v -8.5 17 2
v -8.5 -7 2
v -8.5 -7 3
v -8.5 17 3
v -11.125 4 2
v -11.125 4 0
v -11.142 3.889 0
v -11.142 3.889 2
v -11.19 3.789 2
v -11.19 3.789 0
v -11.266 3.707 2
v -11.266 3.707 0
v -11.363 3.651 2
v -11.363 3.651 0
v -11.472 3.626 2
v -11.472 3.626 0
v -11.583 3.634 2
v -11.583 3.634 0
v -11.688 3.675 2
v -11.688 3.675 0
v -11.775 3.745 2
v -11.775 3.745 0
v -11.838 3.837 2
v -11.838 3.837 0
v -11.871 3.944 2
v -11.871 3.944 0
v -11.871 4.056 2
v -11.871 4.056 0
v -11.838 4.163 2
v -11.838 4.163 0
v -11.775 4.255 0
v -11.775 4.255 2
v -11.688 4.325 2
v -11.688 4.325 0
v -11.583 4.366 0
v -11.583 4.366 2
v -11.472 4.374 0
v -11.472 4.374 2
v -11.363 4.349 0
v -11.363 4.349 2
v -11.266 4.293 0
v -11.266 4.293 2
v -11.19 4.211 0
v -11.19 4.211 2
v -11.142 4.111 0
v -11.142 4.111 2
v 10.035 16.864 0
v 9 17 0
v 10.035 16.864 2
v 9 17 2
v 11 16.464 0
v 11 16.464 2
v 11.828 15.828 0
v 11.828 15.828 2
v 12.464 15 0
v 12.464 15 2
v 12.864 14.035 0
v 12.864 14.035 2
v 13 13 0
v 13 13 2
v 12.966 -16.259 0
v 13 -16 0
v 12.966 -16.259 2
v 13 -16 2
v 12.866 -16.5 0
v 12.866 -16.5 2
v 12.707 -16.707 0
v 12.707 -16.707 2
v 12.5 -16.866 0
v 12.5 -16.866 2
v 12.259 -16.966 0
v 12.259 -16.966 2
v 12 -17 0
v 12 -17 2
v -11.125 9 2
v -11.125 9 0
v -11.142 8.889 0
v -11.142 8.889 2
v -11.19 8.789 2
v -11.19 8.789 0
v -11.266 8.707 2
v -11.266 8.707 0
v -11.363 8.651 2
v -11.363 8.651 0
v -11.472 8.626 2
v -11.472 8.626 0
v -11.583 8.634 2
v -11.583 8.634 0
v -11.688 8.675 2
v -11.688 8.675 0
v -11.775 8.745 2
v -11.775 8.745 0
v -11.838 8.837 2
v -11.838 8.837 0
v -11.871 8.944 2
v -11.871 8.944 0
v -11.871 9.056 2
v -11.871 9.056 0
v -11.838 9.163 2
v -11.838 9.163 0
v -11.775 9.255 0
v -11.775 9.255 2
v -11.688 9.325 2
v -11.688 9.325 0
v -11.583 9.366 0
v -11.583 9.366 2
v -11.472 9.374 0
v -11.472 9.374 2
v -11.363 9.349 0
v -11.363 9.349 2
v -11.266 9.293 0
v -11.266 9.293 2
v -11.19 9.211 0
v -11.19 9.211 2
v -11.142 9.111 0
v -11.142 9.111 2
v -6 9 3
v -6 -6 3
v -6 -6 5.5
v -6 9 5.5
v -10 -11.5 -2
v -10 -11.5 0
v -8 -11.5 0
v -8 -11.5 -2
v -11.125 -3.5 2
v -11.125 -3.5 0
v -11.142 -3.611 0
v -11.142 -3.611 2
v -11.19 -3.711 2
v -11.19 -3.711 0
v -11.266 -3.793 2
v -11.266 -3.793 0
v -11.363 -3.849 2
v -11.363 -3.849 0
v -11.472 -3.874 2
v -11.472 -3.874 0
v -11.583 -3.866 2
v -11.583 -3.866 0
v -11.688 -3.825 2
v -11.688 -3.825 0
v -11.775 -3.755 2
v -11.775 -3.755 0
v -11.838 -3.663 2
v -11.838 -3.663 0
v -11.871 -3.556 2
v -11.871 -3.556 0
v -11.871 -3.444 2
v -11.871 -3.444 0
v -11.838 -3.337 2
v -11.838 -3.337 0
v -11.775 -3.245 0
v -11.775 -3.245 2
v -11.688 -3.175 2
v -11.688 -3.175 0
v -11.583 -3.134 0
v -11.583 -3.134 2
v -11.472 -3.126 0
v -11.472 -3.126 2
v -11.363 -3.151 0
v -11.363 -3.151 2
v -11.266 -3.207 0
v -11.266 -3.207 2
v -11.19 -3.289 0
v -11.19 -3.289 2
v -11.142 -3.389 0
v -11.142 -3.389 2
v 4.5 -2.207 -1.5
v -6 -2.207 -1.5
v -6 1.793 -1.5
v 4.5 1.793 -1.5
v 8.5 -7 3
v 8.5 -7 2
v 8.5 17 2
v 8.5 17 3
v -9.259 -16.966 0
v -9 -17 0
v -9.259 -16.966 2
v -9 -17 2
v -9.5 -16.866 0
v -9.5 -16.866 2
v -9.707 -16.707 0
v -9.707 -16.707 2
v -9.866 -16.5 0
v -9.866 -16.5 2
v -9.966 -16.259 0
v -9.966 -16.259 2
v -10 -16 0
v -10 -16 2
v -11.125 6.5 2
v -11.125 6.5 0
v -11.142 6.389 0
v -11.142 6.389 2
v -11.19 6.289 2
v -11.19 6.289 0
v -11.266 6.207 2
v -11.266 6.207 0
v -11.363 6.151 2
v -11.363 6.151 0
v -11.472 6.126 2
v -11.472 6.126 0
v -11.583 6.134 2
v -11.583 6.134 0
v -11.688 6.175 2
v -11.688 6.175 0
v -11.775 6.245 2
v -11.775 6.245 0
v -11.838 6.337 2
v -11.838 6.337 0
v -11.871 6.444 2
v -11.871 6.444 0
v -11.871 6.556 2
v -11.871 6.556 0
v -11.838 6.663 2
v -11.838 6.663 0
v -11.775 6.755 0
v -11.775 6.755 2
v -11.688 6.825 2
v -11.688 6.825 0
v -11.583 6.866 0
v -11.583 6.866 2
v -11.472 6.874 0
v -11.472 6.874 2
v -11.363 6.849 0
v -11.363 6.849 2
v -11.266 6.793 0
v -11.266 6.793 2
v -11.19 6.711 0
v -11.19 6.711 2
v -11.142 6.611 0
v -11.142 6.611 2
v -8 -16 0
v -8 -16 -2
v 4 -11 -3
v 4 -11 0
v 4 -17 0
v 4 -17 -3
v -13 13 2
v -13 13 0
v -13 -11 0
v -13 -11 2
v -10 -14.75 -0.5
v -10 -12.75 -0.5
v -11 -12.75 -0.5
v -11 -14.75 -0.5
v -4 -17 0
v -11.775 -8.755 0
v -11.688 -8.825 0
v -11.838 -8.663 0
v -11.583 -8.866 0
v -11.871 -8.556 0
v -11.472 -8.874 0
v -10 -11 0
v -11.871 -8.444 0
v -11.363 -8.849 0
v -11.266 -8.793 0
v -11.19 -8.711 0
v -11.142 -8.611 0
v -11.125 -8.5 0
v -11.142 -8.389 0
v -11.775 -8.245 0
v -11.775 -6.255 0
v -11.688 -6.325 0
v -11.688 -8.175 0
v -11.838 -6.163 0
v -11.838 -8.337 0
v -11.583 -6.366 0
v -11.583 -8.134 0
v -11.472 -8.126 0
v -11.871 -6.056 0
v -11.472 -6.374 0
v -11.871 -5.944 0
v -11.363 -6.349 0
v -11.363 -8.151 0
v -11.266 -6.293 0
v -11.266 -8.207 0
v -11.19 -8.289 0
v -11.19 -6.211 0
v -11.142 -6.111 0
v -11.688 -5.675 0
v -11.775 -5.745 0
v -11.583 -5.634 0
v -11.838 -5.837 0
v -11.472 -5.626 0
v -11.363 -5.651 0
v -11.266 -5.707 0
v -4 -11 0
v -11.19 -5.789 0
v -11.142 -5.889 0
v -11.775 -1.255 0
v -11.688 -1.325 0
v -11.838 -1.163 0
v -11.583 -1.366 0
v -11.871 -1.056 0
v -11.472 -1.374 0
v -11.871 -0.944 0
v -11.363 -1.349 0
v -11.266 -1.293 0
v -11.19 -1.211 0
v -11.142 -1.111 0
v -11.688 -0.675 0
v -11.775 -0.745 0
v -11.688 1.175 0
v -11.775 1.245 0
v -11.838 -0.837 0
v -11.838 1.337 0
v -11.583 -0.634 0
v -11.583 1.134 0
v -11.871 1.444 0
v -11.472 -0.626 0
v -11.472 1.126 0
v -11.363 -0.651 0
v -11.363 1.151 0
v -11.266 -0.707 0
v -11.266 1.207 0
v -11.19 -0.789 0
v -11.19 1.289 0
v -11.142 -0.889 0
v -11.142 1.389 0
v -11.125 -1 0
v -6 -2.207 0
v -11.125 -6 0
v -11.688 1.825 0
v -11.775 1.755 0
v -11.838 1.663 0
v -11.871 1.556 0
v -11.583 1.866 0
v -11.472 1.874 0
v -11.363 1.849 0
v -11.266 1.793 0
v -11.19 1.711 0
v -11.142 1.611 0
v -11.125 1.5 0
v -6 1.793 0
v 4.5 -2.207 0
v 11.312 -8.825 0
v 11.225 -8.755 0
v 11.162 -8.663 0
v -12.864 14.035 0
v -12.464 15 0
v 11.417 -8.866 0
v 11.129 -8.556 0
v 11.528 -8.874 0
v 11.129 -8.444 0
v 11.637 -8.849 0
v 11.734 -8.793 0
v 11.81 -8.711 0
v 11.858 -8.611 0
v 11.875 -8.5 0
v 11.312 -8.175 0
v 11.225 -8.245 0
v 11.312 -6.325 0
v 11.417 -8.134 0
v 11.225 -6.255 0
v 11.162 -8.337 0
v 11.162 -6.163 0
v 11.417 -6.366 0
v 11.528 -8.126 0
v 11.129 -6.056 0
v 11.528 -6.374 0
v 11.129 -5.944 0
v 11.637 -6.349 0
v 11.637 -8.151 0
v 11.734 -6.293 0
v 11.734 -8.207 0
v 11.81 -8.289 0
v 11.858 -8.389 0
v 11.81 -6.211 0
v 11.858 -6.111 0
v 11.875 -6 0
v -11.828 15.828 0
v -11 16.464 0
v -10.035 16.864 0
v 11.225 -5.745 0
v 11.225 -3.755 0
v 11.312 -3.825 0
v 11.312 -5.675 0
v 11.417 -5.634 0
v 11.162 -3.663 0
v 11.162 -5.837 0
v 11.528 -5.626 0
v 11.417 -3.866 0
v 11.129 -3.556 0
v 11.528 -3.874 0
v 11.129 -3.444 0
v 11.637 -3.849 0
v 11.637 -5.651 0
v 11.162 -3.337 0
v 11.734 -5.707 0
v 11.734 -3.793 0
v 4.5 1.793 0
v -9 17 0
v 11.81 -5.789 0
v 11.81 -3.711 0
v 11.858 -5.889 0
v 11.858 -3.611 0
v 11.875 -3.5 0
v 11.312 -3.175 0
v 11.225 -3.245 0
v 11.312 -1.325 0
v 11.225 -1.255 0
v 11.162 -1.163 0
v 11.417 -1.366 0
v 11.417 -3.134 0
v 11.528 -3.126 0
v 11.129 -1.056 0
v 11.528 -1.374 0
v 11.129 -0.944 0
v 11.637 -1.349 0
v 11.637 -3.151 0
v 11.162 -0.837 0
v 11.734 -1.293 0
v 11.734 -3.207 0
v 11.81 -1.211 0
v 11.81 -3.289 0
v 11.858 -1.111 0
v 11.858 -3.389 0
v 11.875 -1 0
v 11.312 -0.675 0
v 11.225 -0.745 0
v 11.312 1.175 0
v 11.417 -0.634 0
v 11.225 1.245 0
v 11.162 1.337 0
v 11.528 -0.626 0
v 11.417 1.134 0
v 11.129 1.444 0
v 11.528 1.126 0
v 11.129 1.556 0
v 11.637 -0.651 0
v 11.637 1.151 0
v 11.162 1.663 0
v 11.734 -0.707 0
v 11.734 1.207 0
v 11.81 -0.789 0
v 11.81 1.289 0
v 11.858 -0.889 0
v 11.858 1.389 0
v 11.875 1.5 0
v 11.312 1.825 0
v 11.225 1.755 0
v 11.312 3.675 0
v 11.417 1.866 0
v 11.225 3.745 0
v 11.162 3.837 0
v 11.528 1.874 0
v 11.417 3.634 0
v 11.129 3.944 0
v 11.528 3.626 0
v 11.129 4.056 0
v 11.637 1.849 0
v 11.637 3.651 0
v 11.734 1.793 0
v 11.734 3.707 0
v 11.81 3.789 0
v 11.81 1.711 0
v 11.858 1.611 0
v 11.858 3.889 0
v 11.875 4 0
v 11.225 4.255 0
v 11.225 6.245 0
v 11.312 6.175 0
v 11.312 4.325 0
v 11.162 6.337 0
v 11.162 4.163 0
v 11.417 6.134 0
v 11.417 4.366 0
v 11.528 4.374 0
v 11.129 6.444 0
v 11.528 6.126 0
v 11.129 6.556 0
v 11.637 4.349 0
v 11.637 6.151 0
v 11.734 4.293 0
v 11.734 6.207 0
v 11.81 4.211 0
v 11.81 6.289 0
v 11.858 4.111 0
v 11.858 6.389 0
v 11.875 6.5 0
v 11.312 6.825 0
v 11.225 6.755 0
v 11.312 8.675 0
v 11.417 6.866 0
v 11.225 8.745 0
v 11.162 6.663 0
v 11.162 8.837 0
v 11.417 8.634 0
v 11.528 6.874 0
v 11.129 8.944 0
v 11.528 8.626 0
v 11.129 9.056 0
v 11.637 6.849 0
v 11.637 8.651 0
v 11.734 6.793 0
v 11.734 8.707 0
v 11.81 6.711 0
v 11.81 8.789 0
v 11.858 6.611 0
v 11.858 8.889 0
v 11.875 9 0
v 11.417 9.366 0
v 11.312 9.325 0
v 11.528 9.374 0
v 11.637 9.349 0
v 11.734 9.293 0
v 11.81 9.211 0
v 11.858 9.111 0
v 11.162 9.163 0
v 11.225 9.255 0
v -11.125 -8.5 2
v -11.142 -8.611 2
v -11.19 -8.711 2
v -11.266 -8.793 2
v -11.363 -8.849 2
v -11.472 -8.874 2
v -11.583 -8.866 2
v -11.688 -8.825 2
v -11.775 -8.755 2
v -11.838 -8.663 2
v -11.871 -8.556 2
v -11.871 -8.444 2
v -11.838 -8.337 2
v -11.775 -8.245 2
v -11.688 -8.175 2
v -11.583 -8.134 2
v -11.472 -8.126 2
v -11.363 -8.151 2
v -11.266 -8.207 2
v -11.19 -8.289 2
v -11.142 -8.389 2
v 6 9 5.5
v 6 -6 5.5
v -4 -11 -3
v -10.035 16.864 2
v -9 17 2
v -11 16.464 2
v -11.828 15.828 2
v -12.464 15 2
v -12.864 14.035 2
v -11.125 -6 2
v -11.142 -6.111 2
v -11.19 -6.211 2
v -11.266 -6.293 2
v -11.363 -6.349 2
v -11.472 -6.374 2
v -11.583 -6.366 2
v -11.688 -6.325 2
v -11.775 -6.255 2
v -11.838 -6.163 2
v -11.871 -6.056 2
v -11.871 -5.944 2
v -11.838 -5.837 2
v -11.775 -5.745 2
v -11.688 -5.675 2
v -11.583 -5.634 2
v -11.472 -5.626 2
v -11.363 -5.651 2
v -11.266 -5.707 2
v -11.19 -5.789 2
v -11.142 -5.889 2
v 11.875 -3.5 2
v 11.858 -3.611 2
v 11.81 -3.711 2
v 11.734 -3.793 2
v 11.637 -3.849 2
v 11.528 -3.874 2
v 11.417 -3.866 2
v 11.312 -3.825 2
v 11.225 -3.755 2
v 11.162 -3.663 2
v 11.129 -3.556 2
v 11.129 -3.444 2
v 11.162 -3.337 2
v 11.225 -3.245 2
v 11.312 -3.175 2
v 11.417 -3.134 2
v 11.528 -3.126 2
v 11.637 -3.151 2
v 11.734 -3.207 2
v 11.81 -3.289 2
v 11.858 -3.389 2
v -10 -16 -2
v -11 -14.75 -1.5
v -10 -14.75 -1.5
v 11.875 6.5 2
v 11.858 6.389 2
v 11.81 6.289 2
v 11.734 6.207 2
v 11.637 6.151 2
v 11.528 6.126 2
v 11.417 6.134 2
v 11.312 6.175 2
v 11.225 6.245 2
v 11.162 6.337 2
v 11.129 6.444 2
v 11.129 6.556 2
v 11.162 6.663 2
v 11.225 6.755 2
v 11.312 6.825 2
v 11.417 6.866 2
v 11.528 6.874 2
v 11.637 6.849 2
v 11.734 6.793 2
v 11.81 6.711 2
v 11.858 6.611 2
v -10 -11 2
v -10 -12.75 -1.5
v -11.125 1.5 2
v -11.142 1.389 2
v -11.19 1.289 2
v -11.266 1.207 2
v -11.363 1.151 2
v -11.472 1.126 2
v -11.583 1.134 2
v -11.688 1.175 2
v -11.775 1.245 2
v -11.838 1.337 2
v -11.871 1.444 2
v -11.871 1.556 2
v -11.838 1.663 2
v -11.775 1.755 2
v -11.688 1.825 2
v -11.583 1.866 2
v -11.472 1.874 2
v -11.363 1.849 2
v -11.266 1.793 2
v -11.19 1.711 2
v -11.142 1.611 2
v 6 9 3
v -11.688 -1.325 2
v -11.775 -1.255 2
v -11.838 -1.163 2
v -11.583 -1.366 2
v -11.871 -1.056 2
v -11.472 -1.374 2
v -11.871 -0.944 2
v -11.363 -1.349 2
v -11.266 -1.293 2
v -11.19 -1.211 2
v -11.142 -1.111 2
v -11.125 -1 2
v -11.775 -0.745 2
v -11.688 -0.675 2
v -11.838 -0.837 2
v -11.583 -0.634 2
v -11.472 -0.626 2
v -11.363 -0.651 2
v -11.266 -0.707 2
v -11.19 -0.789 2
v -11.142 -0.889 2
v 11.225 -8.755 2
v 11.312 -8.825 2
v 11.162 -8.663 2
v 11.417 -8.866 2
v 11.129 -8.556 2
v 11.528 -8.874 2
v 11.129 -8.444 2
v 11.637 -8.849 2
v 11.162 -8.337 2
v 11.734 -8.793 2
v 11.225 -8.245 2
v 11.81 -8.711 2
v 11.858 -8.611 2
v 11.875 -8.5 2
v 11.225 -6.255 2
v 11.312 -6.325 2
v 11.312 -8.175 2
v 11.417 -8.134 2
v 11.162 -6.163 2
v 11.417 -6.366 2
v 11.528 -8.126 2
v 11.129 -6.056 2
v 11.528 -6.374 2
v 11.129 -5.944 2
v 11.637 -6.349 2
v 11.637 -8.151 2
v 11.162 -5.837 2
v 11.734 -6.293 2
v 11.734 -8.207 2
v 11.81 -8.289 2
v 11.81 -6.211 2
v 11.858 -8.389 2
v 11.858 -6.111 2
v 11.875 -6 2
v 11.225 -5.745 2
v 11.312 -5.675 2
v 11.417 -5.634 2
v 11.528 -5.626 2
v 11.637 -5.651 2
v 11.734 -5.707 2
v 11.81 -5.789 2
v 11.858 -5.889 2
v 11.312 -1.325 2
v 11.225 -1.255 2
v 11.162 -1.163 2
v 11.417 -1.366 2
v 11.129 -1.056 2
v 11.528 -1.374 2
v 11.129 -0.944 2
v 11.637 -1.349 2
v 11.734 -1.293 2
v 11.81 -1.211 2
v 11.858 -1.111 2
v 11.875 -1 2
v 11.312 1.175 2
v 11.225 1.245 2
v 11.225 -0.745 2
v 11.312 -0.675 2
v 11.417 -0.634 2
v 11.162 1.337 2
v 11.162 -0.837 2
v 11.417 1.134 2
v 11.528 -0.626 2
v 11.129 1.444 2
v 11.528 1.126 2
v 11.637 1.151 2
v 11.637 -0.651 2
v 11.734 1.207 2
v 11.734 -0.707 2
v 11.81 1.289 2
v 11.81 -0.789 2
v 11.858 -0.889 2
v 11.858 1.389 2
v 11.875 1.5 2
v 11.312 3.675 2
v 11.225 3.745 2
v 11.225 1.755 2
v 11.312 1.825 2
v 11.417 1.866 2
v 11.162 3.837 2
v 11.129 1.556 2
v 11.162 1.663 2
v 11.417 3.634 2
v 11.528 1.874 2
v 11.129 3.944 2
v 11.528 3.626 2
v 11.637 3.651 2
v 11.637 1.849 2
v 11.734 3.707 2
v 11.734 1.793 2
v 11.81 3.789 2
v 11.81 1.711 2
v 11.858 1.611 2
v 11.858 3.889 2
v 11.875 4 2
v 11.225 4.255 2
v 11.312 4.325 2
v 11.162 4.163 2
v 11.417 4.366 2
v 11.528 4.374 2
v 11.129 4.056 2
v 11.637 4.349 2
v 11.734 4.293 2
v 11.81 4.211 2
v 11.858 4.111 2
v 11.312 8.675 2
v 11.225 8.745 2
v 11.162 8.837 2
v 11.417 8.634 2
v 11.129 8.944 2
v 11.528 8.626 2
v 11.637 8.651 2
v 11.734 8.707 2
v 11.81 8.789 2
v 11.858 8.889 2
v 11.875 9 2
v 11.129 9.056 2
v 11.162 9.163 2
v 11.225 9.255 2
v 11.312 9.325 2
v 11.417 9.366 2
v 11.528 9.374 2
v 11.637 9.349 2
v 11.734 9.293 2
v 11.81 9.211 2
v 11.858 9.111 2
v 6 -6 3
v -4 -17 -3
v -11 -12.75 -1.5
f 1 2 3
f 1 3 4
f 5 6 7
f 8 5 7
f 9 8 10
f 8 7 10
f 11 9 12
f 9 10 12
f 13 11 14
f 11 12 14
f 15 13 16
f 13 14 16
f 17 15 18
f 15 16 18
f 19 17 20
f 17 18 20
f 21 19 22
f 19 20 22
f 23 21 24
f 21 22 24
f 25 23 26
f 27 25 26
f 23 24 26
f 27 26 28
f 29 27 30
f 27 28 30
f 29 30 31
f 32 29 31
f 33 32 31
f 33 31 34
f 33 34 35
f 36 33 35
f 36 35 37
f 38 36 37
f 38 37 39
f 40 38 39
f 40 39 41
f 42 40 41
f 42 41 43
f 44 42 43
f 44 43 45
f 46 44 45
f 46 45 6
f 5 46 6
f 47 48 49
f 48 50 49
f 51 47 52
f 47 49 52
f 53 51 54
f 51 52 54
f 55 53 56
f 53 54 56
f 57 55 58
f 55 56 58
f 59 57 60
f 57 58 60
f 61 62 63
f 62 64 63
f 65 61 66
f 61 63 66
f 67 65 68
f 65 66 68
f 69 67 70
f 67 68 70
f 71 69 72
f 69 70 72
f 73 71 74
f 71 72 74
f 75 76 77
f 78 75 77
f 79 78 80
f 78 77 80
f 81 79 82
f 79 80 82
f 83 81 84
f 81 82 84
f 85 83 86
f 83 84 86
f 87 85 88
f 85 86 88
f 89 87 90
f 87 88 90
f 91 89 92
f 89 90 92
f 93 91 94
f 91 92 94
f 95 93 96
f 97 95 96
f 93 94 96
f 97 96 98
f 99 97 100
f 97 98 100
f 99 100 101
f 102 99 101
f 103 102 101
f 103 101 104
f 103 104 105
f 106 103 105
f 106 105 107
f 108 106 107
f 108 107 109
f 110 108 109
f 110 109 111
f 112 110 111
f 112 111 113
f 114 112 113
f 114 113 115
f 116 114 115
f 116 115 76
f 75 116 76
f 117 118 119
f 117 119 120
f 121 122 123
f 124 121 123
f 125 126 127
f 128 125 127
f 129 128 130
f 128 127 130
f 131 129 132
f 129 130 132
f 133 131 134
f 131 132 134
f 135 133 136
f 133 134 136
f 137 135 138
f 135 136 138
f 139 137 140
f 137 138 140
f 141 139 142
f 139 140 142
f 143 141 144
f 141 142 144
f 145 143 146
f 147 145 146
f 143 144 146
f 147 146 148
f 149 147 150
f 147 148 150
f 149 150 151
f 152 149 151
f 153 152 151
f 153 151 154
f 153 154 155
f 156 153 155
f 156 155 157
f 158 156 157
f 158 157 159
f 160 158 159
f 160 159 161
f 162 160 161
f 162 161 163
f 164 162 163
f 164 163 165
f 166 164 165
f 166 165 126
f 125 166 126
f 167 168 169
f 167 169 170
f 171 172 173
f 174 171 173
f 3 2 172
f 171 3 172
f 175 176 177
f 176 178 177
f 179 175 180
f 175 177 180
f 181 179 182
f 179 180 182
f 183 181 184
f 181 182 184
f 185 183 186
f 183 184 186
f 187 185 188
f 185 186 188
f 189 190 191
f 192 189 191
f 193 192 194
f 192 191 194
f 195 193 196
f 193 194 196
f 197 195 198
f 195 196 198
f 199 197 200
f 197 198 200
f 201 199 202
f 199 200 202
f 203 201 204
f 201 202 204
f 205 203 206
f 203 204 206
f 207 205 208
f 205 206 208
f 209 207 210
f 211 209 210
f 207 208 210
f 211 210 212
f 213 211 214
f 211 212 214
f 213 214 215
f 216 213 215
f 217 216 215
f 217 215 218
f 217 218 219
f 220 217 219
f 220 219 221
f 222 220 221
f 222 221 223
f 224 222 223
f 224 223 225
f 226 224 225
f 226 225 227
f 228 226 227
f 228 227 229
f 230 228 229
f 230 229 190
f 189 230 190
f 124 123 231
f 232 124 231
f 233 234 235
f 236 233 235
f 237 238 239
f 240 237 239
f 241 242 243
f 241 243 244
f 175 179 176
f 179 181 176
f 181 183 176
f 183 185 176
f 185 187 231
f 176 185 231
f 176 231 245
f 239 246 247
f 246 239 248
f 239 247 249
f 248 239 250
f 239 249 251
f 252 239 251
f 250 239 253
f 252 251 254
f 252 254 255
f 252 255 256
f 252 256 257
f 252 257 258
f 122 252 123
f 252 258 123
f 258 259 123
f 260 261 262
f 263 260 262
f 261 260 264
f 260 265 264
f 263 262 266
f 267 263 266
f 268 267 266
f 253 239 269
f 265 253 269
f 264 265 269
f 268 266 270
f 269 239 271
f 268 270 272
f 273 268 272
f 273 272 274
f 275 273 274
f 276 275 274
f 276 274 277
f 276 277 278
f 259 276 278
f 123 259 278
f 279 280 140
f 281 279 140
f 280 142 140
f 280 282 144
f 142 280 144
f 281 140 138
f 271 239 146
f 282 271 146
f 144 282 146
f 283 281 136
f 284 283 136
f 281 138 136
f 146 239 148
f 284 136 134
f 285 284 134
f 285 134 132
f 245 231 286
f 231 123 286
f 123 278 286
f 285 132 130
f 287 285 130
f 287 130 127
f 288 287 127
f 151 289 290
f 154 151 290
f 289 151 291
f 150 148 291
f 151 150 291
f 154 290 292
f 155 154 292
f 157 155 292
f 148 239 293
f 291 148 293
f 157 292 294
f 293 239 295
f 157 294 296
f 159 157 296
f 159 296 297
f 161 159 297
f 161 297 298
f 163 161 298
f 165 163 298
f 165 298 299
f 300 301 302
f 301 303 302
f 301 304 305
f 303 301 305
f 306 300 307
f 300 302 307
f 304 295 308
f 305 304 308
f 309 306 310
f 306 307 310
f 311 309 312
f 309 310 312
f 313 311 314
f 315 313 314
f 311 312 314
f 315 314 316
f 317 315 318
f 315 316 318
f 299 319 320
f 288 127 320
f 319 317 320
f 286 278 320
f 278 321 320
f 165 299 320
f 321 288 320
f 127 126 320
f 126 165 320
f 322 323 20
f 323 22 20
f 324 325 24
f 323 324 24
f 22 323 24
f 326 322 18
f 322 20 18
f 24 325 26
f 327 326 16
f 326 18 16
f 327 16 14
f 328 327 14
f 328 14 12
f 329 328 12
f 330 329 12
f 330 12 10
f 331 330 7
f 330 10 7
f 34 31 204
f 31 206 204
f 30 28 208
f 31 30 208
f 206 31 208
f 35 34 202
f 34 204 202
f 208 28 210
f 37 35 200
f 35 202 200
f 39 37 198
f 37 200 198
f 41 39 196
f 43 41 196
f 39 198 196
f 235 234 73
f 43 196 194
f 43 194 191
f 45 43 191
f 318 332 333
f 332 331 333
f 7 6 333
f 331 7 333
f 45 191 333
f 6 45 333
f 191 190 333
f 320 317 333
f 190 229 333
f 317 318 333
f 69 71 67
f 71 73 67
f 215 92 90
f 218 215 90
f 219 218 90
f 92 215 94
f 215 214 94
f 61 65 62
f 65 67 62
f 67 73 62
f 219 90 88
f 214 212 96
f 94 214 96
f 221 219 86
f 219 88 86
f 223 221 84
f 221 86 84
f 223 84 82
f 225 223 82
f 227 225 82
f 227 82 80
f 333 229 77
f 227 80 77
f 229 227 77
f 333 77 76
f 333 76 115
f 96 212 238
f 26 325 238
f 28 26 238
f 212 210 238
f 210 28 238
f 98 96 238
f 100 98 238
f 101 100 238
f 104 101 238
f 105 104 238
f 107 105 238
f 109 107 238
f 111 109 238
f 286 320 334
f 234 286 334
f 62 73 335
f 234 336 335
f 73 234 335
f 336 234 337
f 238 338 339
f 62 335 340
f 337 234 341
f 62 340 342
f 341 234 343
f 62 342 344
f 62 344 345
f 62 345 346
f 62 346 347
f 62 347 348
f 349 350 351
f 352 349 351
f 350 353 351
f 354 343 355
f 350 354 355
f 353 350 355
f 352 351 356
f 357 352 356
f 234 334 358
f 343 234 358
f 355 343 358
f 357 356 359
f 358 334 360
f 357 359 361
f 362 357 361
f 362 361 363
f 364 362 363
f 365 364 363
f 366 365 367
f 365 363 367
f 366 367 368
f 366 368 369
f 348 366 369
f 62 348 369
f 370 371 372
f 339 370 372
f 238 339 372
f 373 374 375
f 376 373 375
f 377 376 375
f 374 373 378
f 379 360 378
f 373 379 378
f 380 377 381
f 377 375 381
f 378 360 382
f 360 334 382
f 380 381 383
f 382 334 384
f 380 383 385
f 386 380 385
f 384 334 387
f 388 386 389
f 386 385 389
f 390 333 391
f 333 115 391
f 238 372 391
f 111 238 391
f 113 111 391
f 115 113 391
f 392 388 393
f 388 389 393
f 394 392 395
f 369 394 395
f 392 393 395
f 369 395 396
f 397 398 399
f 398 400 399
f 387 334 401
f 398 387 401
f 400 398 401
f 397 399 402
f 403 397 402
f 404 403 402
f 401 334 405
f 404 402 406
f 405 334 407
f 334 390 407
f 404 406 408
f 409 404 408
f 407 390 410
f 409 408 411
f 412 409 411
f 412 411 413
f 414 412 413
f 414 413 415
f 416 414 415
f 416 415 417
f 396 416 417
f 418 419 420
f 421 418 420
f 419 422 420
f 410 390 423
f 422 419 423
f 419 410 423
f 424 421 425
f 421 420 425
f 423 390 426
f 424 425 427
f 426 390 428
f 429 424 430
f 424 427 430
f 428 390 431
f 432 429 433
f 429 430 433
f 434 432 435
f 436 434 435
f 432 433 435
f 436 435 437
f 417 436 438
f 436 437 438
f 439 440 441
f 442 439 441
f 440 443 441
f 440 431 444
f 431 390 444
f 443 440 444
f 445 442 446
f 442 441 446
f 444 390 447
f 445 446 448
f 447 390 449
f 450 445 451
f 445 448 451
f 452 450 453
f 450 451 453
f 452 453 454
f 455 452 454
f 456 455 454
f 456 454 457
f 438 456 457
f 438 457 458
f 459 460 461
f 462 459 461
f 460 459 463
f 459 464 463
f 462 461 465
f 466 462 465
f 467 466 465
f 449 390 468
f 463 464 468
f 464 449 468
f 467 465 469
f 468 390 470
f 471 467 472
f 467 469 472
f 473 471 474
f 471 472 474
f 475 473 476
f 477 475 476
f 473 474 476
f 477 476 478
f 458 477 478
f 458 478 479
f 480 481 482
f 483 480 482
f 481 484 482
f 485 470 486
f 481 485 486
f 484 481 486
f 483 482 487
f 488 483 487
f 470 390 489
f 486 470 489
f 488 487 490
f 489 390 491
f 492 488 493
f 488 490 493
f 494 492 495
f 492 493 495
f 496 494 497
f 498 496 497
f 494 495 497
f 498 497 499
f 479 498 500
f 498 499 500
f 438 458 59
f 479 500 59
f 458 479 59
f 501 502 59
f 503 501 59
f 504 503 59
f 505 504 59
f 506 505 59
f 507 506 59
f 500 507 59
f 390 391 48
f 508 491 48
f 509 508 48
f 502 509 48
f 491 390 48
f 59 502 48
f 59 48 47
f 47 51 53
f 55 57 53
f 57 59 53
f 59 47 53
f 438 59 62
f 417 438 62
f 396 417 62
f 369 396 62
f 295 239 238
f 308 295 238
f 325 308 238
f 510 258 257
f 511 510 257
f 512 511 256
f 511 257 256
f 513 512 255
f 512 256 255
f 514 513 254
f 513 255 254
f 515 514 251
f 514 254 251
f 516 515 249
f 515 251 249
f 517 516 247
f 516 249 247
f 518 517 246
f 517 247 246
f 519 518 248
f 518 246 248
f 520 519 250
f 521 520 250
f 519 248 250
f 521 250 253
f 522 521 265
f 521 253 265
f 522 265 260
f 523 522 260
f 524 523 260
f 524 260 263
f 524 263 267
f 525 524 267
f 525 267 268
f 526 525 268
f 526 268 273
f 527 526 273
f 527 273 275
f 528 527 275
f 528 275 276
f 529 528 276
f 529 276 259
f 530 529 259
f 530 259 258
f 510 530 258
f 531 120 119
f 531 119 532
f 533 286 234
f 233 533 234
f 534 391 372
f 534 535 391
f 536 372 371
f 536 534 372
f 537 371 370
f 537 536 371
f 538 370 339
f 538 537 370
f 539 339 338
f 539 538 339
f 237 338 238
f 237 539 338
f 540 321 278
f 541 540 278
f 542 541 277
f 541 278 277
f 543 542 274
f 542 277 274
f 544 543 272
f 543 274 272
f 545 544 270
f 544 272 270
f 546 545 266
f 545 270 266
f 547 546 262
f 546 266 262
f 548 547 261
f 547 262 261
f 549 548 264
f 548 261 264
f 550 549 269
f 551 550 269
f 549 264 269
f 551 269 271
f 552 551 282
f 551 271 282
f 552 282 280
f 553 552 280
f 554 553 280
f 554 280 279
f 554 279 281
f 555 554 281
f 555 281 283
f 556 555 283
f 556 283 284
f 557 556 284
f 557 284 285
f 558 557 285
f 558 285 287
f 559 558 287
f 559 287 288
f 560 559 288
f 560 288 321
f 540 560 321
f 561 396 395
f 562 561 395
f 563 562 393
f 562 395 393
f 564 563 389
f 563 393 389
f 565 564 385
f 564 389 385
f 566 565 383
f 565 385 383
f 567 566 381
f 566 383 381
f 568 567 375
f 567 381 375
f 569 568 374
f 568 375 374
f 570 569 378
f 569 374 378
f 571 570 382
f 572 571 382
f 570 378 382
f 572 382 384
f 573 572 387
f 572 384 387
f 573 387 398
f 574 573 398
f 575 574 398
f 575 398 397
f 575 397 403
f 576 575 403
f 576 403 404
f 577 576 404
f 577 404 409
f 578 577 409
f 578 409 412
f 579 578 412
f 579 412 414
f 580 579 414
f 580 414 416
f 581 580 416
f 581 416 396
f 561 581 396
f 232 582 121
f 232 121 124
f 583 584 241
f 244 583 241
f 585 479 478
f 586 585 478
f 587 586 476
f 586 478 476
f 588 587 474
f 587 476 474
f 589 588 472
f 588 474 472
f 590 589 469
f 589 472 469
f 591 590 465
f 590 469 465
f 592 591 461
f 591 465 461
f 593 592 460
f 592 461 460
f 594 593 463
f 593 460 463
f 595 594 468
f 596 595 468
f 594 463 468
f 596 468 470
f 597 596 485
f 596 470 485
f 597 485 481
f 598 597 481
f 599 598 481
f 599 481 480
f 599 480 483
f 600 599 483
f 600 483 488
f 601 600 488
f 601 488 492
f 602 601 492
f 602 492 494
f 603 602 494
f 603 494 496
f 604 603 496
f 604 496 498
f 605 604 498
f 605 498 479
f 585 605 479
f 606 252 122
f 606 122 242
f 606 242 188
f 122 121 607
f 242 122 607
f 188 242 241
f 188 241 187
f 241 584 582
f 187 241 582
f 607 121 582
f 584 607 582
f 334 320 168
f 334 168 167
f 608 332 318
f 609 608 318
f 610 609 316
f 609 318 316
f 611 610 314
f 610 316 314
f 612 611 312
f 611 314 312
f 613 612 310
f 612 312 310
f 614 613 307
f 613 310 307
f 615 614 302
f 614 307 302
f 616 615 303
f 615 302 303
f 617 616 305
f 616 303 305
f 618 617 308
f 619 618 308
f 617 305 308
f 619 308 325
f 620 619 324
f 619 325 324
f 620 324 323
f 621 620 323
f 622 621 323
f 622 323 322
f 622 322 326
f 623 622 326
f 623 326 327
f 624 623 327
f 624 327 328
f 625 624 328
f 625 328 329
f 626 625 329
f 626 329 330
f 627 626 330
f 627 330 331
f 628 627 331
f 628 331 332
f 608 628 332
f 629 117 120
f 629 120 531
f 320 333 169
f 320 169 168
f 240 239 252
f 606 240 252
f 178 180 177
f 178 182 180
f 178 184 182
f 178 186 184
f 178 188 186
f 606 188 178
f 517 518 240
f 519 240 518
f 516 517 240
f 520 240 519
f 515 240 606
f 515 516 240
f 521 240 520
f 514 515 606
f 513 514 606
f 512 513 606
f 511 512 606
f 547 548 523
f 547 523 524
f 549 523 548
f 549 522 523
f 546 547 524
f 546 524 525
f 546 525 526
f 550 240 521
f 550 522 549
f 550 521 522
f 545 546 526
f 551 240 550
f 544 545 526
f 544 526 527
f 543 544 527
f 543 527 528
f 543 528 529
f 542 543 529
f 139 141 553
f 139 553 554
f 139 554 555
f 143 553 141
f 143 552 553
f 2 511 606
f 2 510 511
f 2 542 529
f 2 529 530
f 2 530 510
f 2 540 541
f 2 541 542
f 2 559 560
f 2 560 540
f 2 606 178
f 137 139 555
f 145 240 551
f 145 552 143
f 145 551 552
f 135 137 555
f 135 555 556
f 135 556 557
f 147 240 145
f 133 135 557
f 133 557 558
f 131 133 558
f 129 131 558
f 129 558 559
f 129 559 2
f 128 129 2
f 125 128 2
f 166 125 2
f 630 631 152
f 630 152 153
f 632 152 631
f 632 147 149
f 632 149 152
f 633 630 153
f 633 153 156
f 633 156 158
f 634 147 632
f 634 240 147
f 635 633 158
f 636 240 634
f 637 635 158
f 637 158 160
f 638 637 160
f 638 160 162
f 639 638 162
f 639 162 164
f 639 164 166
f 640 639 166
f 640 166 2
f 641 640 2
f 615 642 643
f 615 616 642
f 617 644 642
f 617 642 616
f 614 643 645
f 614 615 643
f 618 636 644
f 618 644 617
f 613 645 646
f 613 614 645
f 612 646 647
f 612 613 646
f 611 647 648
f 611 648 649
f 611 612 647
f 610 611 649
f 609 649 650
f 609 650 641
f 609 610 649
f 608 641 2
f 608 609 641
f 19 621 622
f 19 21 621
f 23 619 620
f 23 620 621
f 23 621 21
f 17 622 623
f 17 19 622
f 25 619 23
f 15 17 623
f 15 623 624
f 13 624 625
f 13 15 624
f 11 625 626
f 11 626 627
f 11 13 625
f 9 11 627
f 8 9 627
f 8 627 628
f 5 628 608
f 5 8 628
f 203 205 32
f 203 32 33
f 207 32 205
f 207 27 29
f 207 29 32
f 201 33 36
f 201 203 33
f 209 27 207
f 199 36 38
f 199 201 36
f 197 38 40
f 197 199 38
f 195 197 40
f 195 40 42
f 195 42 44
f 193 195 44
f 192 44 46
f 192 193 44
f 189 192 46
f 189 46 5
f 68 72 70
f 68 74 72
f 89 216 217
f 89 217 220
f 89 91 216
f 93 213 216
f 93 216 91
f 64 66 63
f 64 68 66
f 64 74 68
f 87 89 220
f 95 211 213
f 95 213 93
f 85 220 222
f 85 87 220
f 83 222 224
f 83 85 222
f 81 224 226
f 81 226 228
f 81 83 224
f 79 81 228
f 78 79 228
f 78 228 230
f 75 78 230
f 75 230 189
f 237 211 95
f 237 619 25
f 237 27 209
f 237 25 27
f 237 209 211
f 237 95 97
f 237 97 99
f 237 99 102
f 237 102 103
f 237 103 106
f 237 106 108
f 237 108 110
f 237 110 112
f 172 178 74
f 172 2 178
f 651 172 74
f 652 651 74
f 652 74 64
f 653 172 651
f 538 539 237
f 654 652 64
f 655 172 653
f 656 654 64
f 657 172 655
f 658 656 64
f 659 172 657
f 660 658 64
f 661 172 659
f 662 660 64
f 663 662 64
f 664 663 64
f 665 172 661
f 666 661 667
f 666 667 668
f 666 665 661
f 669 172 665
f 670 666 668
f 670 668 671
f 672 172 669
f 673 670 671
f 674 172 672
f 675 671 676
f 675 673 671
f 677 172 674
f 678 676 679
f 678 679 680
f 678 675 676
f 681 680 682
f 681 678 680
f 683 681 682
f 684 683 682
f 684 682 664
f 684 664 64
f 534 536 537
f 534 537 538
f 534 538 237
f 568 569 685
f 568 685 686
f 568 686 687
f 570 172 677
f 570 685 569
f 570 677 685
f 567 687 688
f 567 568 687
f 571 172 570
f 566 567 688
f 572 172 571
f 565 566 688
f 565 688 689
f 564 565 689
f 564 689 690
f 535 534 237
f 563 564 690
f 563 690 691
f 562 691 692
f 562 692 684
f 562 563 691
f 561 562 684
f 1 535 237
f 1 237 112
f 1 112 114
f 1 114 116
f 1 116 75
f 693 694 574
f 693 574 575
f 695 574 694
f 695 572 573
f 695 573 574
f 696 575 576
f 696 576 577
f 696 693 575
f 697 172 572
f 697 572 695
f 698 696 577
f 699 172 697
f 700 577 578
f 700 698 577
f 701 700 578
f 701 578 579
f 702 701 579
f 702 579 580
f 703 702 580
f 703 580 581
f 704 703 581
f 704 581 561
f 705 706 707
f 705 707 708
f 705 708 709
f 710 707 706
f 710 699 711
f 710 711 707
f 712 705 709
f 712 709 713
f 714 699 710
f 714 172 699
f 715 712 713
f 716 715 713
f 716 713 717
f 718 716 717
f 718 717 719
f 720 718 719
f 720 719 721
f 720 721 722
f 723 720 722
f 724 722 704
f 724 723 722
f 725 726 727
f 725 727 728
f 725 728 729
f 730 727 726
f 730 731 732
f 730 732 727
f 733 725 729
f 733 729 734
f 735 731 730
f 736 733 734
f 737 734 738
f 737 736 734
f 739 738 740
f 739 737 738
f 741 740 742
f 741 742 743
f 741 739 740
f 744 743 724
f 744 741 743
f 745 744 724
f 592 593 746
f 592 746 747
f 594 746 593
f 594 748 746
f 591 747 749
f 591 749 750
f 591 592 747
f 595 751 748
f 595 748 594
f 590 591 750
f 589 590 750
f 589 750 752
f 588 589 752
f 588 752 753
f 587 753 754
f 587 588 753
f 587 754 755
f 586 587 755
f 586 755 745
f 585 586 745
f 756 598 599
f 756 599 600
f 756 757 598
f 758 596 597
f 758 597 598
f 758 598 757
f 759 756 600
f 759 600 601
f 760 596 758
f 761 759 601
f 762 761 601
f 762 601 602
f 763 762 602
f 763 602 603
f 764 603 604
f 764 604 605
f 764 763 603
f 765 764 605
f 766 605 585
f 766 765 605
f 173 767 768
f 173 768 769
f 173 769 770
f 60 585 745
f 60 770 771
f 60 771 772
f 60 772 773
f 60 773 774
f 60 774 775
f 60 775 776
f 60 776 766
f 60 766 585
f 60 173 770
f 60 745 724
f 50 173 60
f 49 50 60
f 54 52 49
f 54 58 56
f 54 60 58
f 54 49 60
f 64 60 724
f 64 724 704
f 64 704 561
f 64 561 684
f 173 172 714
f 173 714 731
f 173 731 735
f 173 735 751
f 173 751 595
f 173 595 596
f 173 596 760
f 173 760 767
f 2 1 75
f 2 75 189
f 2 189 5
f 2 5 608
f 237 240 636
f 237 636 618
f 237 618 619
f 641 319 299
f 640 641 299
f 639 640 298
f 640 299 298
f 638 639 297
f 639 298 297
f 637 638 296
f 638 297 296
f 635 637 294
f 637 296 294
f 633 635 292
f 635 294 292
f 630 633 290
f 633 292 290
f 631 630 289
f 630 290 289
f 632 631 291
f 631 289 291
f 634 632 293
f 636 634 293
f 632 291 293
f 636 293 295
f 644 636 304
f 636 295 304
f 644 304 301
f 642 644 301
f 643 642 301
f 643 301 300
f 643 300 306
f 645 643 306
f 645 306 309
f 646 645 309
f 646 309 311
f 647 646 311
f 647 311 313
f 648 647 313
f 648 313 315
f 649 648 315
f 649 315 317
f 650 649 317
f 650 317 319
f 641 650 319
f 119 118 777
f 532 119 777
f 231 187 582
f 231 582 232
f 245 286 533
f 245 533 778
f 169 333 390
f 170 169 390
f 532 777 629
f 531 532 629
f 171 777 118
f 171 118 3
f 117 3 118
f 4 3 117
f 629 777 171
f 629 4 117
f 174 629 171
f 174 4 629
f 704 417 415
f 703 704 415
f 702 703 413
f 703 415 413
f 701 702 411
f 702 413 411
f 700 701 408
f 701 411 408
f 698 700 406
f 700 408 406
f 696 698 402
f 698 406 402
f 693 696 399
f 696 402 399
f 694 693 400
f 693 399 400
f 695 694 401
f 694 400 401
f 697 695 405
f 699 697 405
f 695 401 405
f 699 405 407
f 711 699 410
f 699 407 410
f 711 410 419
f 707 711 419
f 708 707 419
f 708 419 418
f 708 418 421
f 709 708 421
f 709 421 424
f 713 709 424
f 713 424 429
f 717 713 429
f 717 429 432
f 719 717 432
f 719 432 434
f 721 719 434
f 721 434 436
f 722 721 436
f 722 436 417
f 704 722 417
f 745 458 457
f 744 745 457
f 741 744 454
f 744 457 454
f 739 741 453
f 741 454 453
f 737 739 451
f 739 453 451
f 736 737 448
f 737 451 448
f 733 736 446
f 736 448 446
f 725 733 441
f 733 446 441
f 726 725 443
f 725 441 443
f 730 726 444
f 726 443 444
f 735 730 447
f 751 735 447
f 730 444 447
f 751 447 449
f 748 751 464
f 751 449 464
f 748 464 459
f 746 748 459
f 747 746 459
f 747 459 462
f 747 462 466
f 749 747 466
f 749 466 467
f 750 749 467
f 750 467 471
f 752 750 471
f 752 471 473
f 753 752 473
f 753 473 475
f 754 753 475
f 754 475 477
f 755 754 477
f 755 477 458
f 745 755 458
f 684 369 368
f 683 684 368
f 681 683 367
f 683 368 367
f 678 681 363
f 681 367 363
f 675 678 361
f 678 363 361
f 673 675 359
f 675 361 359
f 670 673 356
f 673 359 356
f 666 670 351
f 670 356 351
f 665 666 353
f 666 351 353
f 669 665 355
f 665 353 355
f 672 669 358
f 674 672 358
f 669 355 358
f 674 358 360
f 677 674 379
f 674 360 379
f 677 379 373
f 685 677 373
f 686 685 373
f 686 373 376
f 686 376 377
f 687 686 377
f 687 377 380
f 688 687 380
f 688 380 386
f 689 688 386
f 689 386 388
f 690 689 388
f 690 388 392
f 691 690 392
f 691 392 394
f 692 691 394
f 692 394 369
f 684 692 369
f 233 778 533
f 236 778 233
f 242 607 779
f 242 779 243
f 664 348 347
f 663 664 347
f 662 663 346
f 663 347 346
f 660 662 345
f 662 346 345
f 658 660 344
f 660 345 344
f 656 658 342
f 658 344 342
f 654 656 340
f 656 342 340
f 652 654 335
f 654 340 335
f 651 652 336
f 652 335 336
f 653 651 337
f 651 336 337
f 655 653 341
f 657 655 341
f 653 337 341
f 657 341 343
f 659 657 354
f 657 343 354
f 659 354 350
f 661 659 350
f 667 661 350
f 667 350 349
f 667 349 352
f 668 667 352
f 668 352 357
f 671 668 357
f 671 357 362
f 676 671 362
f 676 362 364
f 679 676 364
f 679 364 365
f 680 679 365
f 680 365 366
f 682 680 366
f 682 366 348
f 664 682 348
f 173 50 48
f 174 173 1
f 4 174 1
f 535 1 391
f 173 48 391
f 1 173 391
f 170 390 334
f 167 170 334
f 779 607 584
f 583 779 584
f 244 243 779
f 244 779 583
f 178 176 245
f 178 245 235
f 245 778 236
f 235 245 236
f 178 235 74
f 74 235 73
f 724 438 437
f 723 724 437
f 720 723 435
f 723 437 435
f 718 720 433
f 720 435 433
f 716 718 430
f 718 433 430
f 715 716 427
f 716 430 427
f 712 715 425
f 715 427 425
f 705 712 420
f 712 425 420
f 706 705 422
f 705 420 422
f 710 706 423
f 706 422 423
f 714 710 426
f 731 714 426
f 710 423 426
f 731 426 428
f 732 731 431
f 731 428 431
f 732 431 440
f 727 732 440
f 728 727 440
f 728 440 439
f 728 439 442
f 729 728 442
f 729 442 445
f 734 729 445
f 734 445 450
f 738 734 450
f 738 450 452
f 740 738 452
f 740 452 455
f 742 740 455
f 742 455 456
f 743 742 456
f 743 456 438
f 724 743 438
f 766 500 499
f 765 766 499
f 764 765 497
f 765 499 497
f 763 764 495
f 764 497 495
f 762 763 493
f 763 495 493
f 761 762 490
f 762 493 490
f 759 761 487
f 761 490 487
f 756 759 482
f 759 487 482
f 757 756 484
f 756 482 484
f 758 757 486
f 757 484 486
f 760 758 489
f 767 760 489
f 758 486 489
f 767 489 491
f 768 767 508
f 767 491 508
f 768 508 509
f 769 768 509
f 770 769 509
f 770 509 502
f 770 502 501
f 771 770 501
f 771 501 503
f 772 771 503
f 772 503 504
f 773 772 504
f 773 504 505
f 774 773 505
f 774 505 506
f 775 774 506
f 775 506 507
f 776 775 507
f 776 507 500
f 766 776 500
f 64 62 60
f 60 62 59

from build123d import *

# Parameters (mm, degrees)
F1_DEPTH  = 2
F2_W      = 17
F2_H      = 24
F3_DEPTH  = 1
F4_W      = 12
F4_H      = 15
F5_DEPTH  = 2.5
F6_W      = 8
F6_H      = 6
F7_DEPTH  = 3
F8_W      = 2
F8_H      = 4.5
F9_DEPTH  = 2
F10_W     = 2
F10_H     = 1
F11_DEPTH = 1
F12_W     = 10.5
F12_H     = 4
F13_DEPTH = 1.5
F14_R     = 0.375
F15_DEPTH = 25
F16_R     = 4
F17_R     = 1


with BuildPart() as f1:
    # F0 (on Top) → F1 (new body)
    with BuildSketch(Plane.XY):
        Polygon((13, 17), (-13, 17), (-13, -11), (-10, -11), (-10, -17), (13, -17), align=None)
    extrude(amount=F1_DEPTH)

    # F2 (on face) → F3 (join)
    with BuildSketch(Plane.XY.offset(2)):
        with Locations((0, 5)):
            Rectangle(F2_W, F2_H)
    extrude(amount=F3_DEPTH)

    # F4 (on face) → F5 (join)
    with BuildSketch(Plane.XY.offset(3)):
        with Locations((0, 1.5)):
            Rectangle(F4_W, F4_H)
    extrude(amount=F5_DEPTH)

    # F6 (on face) → F7 (join)
    with BuildSketch(Plane(origin=(0, 0, 0), x_dir=(1, 0, 0), z_dir=(0, 0, -1))):
        with Locations((0, 14)):
            Rectangle(F6_W, F6_H)
    extrude(amount=F7_DEPTH)

    # F8 (on face) → F9 (join)
    with BuildSketch(Plane(origin=(0, 0, 0), x_dir=(1, 0, 0), z_dir=(0, 0, -1))):
        with Locations((-9, 13.75)):
            Rectangle(F8_W, F8_H)
    extrude(amount=F9_DEPTH)

    # F10 (on face) → F11 (join)
    with BuildSketch(Plane(origin=(-10, 0, 0), x_dir=(0, -1, 0), z_dir=(-1, 0, 0))):
        with Locations((13.75, -1)):
            Rectangle(F10_W, F10_H)
    extrude(amount=F11_DEPTH)

    # F12 (on face) → F13 (join)
    with BuildSketch(Plane(origin=(0, 0, 0), x_dir=(1, 0, 0), z_dir=(0, 0, -1))):
        with Locations((-0.75, 0.206931)):
            Rectangle(F12_W, F12_H)
    extrude(amount=F13_DEPTH)

    # F14 (on face) → F15 (cut)
    with BuildSketch(Plane(origin=(0, 0, 0), x_dir=(1, 0, 0), z_dir=(0, 0, -1))):
        with Locations((-11.5, -9)):
            Circle(F14_R)
        with Locations((-11.5, -6.5)):
            Circle(F14_R)
        with Locations((-11.5, -4)):
            Circle(F14_R)
        with Locations((-11.5, -1.5)):
            Circle(F14_R)
        with Locations((-11.5, 1)):
            Circle(F14_R)
        with Locations((-11.5, 3.5)):
            Circle(F14_R)
        with Locations((-11.5, 6)):
            Circle(F14_R)
        with Locations((-11.5, 8.5)):
            Circle(F14_R)
        with Locations((11.5, -9)):
            Circle(F14_R)
        with Locations((11.5, -6.5)):
            Circle(F14_R)
        with Locations((11.5, -4)):
            Circle(F14_R)
        with Locations((11.5, -1.5)):
            Circle(F14_R)
        with Locations((11.5, 1)):
            Circle(F14_R)
        with Locations((11.5, 3.5)):
            Circle(F14_R)
        with Locations((11.5, 6)):
            Circle(F14_R)
        with Locations((11.5, 8.5)):
            Circle(F14_R)
    extrude(amount=-F15_DEPTH, mode=Mode.SUBTRACT)

    # F16
    f16_edges = [f1.edges().sort_by_distance(p)[0] for p in [
        (-13, 17, 1),
        (13, 17, 1),
    ]]
    fillet(f16_edges, radius=F16_R)

    # F17
    f17_edges = [f1.edges().sort_by_distance(p)[0] for p in [
        (-10, -17, 1),
        (13, -17, 1),
    ]]
    fillet(f17_edges, radius=F17_R)


solid = f1.part
